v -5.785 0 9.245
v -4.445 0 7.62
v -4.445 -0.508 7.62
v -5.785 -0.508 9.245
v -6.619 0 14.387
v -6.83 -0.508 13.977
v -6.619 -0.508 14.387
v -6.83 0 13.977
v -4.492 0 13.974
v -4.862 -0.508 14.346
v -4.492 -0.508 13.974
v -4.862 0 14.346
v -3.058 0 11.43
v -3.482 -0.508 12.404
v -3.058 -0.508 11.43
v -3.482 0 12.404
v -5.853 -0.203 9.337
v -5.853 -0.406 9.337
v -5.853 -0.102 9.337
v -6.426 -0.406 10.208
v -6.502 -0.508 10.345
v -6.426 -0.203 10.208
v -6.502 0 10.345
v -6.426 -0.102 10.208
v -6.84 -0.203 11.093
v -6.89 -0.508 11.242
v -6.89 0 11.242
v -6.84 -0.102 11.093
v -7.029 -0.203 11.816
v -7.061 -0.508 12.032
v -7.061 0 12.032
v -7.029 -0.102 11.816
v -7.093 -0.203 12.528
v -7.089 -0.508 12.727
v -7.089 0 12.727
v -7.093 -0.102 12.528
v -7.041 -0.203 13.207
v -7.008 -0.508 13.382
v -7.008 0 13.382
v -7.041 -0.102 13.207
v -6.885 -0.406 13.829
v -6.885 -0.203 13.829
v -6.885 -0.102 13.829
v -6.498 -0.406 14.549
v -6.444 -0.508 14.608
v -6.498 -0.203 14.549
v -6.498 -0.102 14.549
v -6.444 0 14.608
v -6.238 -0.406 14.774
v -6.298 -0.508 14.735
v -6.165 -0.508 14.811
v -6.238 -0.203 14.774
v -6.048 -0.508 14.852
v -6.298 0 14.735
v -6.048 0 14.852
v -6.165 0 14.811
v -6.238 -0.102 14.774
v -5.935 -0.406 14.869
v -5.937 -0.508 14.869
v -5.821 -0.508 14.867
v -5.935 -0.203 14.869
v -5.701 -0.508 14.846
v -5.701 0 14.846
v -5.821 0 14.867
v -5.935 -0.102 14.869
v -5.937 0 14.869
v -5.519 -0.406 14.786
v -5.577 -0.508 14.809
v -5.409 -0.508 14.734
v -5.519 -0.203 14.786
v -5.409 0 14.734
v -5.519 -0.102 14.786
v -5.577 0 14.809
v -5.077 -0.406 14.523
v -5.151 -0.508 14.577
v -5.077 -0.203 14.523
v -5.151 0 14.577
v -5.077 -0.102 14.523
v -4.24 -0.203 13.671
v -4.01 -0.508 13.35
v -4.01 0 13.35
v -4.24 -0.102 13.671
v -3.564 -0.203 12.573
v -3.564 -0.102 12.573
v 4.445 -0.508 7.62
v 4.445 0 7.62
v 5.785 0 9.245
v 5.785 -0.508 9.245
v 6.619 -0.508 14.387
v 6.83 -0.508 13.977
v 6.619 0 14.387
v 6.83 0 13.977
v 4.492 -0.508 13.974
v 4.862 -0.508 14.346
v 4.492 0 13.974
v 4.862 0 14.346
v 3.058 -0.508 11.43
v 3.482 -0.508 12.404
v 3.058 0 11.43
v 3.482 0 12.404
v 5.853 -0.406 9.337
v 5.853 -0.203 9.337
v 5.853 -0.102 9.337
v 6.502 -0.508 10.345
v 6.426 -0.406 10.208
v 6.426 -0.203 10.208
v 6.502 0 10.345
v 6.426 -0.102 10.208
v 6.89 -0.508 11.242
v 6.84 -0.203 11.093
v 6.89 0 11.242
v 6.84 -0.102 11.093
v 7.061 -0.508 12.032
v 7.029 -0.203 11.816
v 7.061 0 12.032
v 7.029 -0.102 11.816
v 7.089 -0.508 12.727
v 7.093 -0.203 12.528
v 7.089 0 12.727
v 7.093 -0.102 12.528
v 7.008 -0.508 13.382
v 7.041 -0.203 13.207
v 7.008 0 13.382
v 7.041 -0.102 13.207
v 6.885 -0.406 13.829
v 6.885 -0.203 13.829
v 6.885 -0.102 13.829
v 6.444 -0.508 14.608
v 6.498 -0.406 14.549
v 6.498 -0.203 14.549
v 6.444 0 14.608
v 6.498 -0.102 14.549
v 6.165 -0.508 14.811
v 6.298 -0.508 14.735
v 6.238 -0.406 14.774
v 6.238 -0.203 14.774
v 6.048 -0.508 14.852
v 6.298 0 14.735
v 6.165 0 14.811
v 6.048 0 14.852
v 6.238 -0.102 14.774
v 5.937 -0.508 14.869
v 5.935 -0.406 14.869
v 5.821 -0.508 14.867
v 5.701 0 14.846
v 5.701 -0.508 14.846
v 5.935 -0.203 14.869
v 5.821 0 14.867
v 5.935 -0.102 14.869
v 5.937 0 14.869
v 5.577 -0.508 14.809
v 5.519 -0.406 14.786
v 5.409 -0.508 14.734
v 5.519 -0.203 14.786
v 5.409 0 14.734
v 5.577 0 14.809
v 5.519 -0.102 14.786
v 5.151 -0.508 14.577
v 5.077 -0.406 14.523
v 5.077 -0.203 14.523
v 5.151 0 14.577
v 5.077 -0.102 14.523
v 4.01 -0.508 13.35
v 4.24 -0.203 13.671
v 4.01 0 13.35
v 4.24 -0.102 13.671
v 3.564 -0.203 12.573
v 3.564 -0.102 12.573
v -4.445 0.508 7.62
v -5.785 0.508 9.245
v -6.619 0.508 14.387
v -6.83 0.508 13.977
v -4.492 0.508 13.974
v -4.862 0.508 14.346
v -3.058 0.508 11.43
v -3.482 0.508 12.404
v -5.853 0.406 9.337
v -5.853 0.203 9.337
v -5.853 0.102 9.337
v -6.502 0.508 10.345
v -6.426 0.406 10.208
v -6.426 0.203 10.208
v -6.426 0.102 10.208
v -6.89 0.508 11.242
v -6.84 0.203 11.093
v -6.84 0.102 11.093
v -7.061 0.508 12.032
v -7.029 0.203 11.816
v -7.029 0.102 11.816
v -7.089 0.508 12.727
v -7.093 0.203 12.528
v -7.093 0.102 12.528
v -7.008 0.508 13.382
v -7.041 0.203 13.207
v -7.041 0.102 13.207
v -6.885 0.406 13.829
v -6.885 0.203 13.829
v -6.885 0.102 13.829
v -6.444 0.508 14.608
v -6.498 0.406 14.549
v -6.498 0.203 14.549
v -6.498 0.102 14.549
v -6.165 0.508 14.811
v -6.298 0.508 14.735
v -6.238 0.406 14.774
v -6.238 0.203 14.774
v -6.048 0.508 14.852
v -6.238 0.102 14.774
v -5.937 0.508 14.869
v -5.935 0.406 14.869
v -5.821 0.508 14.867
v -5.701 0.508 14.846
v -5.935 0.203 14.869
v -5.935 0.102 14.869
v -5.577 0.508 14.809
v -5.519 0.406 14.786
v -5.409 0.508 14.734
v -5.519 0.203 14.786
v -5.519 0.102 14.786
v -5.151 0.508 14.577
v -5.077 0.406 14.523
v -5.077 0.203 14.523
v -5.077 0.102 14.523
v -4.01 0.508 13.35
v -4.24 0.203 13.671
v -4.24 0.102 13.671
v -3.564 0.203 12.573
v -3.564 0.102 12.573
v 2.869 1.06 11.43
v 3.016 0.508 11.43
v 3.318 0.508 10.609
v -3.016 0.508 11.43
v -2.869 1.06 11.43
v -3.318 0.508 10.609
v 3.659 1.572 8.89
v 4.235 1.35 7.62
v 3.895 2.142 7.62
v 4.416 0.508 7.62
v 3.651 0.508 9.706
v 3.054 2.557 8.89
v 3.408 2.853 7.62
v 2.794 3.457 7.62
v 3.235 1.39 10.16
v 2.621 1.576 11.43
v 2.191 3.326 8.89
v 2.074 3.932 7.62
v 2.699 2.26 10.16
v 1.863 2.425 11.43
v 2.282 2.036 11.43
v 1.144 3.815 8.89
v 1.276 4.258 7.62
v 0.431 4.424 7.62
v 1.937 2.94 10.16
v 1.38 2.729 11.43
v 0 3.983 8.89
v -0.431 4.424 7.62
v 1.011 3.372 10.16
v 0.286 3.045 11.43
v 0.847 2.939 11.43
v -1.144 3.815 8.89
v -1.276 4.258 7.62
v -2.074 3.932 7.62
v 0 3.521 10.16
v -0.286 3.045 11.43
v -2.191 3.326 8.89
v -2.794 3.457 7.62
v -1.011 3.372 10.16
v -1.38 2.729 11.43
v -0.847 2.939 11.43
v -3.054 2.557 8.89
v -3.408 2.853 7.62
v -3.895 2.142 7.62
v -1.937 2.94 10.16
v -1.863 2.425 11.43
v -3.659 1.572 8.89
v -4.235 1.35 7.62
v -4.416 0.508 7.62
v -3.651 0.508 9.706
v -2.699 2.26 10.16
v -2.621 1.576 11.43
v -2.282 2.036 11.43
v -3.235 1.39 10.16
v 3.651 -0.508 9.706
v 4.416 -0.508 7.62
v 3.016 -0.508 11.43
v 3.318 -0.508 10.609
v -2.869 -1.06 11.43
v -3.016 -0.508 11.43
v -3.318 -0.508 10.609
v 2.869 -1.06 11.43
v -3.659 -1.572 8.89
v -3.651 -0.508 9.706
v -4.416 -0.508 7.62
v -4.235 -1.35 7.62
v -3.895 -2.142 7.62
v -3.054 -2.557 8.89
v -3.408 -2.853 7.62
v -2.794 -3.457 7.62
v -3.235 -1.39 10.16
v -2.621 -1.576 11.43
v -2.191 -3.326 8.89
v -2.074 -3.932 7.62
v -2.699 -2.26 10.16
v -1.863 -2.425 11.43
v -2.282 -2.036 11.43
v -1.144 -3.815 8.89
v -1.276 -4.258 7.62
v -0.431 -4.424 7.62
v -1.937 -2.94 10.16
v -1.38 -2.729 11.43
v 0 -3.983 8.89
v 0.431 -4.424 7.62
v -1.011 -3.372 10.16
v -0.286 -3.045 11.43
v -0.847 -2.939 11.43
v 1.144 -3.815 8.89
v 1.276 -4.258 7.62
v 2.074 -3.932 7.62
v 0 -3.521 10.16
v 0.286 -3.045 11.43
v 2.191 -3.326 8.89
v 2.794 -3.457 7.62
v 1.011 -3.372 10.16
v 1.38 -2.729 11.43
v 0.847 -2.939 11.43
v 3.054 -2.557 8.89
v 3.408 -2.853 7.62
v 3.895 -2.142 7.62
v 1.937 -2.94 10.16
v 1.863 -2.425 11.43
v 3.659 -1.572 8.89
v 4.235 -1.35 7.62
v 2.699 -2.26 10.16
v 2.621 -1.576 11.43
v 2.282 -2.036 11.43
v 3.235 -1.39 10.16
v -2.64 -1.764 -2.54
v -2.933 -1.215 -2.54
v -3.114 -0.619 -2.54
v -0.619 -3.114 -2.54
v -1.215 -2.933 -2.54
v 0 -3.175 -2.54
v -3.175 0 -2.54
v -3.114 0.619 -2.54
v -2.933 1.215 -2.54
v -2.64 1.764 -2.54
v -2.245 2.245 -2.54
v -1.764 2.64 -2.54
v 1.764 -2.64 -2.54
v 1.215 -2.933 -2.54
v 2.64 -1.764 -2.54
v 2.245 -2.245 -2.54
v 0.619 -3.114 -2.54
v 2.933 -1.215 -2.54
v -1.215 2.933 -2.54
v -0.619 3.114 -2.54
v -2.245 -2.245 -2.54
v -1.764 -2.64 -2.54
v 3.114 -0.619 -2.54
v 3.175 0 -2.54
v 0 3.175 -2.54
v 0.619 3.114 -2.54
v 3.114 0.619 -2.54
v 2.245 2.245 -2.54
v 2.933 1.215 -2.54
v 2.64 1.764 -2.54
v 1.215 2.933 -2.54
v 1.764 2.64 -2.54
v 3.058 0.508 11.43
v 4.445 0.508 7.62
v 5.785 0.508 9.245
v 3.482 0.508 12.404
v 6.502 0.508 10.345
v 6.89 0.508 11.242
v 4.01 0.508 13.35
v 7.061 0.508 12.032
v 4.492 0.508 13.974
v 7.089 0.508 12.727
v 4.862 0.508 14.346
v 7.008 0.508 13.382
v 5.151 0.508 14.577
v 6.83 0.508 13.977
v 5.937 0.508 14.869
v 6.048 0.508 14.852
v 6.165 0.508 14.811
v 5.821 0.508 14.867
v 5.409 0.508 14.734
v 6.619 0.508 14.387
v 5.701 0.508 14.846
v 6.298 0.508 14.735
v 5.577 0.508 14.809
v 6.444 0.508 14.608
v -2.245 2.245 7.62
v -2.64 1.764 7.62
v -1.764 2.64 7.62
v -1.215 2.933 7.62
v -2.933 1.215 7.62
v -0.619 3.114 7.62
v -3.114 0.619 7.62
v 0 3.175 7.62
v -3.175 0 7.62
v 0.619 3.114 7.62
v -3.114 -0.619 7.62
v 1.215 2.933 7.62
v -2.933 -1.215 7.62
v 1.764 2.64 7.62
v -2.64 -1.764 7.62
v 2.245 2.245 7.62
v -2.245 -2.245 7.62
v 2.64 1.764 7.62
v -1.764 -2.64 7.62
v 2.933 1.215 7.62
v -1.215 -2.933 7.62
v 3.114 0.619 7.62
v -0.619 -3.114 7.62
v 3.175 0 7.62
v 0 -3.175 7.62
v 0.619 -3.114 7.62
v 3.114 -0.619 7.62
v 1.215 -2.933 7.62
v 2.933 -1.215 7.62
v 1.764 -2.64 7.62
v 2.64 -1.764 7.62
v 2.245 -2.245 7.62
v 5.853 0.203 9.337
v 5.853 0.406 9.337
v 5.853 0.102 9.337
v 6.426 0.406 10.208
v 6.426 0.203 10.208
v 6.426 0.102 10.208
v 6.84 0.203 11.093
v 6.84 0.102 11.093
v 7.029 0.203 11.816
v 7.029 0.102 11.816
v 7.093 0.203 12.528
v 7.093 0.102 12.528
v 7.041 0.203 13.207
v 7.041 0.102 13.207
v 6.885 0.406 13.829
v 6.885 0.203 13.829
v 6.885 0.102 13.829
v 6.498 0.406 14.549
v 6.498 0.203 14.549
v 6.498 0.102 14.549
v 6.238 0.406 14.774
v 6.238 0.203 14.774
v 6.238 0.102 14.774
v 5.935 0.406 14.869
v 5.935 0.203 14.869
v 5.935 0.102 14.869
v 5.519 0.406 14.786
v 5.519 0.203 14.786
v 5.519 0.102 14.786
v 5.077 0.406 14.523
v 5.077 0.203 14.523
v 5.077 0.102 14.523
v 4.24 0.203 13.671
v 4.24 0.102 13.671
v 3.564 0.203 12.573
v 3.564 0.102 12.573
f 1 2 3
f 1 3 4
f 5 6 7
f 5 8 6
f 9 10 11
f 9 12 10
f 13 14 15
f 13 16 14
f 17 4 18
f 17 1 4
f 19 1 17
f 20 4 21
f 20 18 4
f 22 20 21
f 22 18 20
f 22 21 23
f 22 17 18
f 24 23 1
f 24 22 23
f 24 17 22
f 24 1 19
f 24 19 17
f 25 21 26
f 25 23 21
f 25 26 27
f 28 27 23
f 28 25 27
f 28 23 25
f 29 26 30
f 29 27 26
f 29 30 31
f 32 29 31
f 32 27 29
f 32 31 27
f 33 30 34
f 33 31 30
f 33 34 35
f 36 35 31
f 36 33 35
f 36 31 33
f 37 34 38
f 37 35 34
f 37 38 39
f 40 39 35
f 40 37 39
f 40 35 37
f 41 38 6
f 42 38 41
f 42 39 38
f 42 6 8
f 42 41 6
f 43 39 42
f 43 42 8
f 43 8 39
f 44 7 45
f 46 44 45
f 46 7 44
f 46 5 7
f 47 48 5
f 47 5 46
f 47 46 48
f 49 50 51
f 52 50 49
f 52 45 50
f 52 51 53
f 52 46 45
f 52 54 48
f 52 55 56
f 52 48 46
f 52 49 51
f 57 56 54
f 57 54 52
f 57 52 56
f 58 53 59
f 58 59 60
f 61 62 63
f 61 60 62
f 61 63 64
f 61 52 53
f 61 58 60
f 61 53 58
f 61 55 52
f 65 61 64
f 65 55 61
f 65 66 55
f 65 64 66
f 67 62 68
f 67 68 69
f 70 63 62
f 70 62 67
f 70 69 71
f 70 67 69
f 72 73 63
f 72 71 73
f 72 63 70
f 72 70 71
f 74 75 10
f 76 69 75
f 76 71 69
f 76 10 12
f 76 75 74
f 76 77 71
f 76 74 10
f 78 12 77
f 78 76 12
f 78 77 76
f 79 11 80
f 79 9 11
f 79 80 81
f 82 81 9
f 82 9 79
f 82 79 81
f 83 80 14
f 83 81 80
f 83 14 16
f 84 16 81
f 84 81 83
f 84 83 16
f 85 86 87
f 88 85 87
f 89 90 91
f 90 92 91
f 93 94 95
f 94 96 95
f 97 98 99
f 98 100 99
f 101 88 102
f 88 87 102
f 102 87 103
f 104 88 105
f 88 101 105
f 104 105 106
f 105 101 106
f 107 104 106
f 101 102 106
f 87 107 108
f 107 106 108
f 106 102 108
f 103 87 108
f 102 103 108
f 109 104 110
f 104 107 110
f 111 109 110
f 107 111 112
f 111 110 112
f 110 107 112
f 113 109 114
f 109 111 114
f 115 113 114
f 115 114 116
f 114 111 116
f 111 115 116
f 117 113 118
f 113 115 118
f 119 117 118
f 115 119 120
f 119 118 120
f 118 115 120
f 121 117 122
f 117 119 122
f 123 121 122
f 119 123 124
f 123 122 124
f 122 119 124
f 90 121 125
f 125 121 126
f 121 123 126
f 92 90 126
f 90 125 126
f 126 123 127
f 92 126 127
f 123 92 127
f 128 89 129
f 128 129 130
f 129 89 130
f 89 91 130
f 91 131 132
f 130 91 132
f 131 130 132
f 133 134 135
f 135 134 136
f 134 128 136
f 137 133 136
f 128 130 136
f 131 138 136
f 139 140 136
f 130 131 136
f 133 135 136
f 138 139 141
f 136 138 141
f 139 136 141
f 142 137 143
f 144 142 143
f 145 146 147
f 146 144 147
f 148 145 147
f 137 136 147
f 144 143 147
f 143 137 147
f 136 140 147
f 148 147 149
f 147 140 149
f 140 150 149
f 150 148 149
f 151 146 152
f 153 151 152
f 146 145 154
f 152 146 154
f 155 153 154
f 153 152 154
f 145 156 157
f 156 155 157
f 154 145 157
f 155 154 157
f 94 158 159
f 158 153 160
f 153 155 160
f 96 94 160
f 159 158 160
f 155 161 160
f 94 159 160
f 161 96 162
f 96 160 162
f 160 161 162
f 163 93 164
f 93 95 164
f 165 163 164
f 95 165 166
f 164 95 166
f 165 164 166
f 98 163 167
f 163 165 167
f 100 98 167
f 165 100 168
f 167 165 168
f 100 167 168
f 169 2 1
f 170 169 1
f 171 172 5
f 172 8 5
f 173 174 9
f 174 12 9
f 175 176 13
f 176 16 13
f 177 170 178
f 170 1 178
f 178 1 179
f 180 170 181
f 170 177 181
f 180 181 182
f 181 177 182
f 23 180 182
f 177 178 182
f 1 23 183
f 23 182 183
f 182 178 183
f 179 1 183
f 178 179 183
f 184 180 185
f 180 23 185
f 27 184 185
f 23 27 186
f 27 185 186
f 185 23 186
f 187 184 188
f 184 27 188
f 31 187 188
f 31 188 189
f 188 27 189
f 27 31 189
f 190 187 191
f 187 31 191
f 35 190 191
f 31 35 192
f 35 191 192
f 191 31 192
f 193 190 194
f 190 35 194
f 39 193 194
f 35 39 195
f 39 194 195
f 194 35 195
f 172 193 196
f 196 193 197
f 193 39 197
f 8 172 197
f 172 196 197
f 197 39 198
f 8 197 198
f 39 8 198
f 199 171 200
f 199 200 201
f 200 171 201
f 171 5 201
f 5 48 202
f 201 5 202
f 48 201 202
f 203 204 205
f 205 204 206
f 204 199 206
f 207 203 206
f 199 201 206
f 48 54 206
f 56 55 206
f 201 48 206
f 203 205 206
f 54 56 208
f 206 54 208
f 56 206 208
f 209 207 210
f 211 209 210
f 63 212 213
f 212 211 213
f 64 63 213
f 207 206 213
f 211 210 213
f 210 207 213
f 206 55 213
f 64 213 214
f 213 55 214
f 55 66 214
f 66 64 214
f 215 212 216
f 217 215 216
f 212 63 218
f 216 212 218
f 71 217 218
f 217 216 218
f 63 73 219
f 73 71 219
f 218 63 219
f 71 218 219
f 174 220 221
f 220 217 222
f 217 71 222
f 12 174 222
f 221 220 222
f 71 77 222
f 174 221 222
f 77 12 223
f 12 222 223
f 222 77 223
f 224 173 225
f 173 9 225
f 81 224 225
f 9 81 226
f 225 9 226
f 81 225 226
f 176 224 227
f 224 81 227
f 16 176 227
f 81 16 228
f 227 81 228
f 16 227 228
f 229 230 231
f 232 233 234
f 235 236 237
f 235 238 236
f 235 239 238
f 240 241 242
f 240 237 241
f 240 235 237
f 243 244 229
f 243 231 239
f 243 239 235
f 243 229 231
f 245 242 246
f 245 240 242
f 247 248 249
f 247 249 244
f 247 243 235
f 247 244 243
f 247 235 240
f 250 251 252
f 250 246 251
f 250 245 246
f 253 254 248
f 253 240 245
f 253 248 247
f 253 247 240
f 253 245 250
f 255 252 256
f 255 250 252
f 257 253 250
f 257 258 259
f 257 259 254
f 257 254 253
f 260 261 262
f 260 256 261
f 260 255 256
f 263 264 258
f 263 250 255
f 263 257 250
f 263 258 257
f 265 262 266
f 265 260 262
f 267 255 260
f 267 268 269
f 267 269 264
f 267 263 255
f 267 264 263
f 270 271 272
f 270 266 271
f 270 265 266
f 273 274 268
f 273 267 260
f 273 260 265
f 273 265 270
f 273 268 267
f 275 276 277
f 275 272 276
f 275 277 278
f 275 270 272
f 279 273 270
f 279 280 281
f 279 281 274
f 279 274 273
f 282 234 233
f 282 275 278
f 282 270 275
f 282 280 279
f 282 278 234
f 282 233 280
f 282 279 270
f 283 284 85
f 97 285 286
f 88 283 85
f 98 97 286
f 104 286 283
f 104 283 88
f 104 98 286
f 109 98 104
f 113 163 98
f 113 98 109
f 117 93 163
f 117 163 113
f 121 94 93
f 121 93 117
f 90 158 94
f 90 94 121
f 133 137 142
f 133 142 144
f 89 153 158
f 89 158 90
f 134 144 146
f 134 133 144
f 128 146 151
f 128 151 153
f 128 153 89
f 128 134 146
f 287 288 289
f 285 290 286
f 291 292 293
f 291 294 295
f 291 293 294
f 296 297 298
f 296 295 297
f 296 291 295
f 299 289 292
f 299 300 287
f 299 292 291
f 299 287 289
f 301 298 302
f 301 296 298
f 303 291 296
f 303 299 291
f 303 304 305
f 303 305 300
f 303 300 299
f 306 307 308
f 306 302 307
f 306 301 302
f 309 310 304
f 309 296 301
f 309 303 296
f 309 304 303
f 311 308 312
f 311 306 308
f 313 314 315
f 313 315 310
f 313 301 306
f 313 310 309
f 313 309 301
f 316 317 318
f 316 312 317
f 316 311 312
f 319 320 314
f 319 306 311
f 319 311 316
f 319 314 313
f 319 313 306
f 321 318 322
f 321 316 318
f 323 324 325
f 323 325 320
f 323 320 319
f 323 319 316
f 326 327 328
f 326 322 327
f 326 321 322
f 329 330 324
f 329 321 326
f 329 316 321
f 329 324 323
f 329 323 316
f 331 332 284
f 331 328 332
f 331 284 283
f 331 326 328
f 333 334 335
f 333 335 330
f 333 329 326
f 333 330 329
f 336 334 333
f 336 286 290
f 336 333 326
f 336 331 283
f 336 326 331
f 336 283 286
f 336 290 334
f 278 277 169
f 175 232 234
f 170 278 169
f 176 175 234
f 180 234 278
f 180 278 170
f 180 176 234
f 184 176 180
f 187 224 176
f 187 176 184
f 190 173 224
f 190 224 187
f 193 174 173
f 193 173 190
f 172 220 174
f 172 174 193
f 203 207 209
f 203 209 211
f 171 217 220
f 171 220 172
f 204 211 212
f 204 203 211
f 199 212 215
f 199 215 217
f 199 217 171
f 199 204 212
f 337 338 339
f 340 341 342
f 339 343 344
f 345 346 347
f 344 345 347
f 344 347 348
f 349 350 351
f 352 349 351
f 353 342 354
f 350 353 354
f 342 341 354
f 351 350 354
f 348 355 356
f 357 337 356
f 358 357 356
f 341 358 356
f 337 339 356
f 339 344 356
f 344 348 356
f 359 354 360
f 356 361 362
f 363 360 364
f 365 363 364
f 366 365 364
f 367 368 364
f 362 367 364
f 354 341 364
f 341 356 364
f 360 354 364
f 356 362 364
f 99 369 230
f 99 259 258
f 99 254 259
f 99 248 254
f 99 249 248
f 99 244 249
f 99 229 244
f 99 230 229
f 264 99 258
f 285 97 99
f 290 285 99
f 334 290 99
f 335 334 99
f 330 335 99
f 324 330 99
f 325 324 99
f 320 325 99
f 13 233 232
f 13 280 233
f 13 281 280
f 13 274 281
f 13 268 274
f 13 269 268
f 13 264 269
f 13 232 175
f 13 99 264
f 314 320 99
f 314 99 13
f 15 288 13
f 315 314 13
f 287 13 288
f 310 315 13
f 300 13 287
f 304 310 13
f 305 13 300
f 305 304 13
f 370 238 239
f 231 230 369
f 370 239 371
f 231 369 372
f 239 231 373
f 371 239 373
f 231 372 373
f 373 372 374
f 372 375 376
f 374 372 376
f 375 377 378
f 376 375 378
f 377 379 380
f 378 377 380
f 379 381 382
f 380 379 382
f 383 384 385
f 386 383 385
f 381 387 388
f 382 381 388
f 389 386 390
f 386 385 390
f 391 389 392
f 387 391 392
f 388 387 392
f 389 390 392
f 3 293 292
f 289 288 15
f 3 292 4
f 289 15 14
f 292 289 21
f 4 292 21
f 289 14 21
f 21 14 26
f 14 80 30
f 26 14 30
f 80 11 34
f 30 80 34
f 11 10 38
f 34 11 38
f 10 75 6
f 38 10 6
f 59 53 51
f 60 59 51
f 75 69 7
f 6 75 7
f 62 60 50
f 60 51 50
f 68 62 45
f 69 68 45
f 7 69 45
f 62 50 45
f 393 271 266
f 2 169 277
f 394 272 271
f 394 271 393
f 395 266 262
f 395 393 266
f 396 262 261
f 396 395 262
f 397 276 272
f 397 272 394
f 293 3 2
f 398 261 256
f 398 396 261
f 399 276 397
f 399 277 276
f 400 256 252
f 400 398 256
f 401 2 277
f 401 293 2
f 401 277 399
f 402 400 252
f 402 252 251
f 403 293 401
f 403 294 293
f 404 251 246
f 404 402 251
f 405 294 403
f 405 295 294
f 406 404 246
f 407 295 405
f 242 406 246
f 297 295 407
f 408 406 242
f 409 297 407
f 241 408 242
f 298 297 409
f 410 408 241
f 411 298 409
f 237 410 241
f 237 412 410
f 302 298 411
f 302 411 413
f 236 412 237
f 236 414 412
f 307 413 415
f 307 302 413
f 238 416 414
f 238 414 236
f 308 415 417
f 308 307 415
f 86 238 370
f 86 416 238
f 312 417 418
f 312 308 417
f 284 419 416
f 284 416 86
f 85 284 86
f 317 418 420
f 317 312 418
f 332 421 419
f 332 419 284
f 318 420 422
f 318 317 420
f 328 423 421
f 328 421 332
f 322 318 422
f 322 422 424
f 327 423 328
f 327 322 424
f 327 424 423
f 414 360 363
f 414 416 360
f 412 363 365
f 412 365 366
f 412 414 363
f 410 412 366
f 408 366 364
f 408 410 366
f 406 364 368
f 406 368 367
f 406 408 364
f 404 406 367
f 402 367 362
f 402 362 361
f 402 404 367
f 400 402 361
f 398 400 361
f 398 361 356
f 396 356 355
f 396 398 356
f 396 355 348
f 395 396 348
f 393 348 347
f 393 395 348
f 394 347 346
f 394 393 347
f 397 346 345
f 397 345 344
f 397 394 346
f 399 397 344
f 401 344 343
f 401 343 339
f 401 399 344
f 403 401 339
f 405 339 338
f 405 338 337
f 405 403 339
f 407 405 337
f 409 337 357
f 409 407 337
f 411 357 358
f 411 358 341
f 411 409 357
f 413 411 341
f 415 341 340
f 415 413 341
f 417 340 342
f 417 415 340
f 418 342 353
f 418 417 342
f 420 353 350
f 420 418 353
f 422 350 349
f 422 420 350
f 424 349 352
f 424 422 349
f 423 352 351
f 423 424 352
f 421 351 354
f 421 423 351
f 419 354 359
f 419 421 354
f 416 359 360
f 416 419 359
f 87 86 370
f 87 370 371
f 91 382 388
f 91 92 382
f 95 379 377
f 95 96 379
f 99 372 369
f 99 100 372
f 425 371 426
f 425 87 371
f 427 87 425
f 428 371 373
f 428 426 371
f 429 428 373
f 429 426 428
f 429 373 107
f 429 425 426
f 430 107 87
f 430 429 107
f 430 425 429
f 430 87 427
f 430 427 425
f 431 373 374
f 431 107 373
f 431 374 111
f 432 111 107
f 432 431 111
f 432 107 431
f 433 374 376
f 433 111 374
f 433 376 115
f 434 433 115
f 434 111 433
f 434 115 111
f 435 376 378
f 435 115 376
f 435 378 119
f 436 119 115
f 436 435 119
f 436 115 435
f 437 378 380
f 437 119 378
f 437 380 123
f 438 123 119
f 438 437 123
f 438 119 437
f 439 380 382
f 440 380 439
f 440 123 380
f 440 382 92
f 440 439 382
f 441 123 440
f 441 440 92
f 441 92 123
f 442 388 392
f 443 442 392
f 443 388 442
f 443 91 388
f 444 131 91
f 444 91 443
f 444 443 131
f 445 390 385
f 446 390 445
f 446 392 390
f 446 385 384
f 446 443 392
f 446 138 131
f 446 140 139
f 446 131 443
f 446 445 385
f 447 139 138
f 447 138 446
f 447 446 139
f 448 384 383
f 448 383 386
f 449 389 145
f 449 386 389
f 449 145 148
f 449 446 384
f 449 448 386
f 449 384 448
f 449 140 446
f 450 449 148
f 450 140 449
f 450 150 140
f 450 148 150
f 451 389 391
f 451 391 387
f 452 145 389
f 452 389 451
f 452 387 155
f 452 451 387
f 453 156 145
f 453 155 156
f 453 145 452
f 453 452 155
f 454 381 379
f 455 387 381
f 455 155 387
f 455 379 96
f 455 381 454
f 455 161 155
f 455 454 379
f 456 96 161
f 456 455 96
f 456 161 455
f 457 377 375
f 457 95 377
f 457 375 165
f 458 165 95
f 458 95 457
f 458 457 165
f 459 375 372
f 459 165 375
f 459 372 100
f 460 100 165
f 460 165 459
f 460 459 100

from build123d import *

# Parameters (mm, degrees)
F0_R          = 3.175
F1_DEPTH      = 7.62
F1_DEPTH_BACK = 2.54
F2_R          = 4.445
F3_DEPTH      = 3.81
F3_TAPER      = 20
F5_DEPTH      = 0.508
F5_DEPTH_BACK = 0.508


with BuildPart() as f1:
    # F0 (on Top) → F1 (new body, two sides)
    with BuildSketch(Plane.XY) as f1_sk:
        Circle(F0_R)
    extrude(amount=F1_DEPTH)
    extrude(f1_sk.sketch, amount=-F1_DEPTH_BACK)

    # F2 (on face) → F3 (join)
    with BuildSketch(Plane.XY.offset(7.62)):
        Circle(F2_R)
    extrude(amount=F3_DEPTH, taper=F3_TAPER)

    # F4 (on Front) → F5 (join, two sides)
    with BuildSketch(Plane.XZ) as f5_sk:
        with BuildLine():
            add(Edge.make_bspline(
                [(-4.445, 7.62), (-5.4306236993, 8.7603855695), (-7.2100212951, 10.8191827983), (-7.1408132194, 13.7602810308), (-5.972645336, 15.3897415196), (-3.9825425825, 13.6576128283), (-3.3763941185, 12.1967136328), (-3.0582734074, 11.43)],
                knots=[0, 0, 0, 0, 0.2590951549, 0.4677579243, 0.6174609687, 0.7992346828, 1, 1, 1, 1], degree=3))
            Line((-4.445, 7.62), (-4.3098494229, 7.62))
            Line((-4.3098494229, 7.62), (-2.9231228303, 11.43))
            Line((-2.9231228303, 11.43), (-3.0582734074, 11.43))
        make_face()
        with BuildLine():
            Line((4.3098494229, 7.62), (4.445, 7.62))
            add(Edge.make_bspline(
                [(4.445, 7.62), (5.4306236993, 8.7603855695), (7.2100212951, 10.8191827983), (7.1408132194, 13.7602810308), (5.972645336, 15.3897415196), (3.9825425825, 13.6576128283), (3.3763941185, 12.1967136328), (3.0582734074, 11.43)],
                knots=[0, 0, 0, 0, 0.2590951549, 0.4677579243, 0.6174609687, 0.7992346828, 1, 1, 1, 1], degree=3))
            Line((3.0582734074, 11.43), (2.9231228303, 11.43))
            Line((2.9231228303, 11.43), (4.3098494229, 7.62))
        make_face()
    extrude(amount=F5_DEPTH)
    extrude(f5_sk.sketch, amount=-F5_DEPTH_BACK)


solid = f1.part
